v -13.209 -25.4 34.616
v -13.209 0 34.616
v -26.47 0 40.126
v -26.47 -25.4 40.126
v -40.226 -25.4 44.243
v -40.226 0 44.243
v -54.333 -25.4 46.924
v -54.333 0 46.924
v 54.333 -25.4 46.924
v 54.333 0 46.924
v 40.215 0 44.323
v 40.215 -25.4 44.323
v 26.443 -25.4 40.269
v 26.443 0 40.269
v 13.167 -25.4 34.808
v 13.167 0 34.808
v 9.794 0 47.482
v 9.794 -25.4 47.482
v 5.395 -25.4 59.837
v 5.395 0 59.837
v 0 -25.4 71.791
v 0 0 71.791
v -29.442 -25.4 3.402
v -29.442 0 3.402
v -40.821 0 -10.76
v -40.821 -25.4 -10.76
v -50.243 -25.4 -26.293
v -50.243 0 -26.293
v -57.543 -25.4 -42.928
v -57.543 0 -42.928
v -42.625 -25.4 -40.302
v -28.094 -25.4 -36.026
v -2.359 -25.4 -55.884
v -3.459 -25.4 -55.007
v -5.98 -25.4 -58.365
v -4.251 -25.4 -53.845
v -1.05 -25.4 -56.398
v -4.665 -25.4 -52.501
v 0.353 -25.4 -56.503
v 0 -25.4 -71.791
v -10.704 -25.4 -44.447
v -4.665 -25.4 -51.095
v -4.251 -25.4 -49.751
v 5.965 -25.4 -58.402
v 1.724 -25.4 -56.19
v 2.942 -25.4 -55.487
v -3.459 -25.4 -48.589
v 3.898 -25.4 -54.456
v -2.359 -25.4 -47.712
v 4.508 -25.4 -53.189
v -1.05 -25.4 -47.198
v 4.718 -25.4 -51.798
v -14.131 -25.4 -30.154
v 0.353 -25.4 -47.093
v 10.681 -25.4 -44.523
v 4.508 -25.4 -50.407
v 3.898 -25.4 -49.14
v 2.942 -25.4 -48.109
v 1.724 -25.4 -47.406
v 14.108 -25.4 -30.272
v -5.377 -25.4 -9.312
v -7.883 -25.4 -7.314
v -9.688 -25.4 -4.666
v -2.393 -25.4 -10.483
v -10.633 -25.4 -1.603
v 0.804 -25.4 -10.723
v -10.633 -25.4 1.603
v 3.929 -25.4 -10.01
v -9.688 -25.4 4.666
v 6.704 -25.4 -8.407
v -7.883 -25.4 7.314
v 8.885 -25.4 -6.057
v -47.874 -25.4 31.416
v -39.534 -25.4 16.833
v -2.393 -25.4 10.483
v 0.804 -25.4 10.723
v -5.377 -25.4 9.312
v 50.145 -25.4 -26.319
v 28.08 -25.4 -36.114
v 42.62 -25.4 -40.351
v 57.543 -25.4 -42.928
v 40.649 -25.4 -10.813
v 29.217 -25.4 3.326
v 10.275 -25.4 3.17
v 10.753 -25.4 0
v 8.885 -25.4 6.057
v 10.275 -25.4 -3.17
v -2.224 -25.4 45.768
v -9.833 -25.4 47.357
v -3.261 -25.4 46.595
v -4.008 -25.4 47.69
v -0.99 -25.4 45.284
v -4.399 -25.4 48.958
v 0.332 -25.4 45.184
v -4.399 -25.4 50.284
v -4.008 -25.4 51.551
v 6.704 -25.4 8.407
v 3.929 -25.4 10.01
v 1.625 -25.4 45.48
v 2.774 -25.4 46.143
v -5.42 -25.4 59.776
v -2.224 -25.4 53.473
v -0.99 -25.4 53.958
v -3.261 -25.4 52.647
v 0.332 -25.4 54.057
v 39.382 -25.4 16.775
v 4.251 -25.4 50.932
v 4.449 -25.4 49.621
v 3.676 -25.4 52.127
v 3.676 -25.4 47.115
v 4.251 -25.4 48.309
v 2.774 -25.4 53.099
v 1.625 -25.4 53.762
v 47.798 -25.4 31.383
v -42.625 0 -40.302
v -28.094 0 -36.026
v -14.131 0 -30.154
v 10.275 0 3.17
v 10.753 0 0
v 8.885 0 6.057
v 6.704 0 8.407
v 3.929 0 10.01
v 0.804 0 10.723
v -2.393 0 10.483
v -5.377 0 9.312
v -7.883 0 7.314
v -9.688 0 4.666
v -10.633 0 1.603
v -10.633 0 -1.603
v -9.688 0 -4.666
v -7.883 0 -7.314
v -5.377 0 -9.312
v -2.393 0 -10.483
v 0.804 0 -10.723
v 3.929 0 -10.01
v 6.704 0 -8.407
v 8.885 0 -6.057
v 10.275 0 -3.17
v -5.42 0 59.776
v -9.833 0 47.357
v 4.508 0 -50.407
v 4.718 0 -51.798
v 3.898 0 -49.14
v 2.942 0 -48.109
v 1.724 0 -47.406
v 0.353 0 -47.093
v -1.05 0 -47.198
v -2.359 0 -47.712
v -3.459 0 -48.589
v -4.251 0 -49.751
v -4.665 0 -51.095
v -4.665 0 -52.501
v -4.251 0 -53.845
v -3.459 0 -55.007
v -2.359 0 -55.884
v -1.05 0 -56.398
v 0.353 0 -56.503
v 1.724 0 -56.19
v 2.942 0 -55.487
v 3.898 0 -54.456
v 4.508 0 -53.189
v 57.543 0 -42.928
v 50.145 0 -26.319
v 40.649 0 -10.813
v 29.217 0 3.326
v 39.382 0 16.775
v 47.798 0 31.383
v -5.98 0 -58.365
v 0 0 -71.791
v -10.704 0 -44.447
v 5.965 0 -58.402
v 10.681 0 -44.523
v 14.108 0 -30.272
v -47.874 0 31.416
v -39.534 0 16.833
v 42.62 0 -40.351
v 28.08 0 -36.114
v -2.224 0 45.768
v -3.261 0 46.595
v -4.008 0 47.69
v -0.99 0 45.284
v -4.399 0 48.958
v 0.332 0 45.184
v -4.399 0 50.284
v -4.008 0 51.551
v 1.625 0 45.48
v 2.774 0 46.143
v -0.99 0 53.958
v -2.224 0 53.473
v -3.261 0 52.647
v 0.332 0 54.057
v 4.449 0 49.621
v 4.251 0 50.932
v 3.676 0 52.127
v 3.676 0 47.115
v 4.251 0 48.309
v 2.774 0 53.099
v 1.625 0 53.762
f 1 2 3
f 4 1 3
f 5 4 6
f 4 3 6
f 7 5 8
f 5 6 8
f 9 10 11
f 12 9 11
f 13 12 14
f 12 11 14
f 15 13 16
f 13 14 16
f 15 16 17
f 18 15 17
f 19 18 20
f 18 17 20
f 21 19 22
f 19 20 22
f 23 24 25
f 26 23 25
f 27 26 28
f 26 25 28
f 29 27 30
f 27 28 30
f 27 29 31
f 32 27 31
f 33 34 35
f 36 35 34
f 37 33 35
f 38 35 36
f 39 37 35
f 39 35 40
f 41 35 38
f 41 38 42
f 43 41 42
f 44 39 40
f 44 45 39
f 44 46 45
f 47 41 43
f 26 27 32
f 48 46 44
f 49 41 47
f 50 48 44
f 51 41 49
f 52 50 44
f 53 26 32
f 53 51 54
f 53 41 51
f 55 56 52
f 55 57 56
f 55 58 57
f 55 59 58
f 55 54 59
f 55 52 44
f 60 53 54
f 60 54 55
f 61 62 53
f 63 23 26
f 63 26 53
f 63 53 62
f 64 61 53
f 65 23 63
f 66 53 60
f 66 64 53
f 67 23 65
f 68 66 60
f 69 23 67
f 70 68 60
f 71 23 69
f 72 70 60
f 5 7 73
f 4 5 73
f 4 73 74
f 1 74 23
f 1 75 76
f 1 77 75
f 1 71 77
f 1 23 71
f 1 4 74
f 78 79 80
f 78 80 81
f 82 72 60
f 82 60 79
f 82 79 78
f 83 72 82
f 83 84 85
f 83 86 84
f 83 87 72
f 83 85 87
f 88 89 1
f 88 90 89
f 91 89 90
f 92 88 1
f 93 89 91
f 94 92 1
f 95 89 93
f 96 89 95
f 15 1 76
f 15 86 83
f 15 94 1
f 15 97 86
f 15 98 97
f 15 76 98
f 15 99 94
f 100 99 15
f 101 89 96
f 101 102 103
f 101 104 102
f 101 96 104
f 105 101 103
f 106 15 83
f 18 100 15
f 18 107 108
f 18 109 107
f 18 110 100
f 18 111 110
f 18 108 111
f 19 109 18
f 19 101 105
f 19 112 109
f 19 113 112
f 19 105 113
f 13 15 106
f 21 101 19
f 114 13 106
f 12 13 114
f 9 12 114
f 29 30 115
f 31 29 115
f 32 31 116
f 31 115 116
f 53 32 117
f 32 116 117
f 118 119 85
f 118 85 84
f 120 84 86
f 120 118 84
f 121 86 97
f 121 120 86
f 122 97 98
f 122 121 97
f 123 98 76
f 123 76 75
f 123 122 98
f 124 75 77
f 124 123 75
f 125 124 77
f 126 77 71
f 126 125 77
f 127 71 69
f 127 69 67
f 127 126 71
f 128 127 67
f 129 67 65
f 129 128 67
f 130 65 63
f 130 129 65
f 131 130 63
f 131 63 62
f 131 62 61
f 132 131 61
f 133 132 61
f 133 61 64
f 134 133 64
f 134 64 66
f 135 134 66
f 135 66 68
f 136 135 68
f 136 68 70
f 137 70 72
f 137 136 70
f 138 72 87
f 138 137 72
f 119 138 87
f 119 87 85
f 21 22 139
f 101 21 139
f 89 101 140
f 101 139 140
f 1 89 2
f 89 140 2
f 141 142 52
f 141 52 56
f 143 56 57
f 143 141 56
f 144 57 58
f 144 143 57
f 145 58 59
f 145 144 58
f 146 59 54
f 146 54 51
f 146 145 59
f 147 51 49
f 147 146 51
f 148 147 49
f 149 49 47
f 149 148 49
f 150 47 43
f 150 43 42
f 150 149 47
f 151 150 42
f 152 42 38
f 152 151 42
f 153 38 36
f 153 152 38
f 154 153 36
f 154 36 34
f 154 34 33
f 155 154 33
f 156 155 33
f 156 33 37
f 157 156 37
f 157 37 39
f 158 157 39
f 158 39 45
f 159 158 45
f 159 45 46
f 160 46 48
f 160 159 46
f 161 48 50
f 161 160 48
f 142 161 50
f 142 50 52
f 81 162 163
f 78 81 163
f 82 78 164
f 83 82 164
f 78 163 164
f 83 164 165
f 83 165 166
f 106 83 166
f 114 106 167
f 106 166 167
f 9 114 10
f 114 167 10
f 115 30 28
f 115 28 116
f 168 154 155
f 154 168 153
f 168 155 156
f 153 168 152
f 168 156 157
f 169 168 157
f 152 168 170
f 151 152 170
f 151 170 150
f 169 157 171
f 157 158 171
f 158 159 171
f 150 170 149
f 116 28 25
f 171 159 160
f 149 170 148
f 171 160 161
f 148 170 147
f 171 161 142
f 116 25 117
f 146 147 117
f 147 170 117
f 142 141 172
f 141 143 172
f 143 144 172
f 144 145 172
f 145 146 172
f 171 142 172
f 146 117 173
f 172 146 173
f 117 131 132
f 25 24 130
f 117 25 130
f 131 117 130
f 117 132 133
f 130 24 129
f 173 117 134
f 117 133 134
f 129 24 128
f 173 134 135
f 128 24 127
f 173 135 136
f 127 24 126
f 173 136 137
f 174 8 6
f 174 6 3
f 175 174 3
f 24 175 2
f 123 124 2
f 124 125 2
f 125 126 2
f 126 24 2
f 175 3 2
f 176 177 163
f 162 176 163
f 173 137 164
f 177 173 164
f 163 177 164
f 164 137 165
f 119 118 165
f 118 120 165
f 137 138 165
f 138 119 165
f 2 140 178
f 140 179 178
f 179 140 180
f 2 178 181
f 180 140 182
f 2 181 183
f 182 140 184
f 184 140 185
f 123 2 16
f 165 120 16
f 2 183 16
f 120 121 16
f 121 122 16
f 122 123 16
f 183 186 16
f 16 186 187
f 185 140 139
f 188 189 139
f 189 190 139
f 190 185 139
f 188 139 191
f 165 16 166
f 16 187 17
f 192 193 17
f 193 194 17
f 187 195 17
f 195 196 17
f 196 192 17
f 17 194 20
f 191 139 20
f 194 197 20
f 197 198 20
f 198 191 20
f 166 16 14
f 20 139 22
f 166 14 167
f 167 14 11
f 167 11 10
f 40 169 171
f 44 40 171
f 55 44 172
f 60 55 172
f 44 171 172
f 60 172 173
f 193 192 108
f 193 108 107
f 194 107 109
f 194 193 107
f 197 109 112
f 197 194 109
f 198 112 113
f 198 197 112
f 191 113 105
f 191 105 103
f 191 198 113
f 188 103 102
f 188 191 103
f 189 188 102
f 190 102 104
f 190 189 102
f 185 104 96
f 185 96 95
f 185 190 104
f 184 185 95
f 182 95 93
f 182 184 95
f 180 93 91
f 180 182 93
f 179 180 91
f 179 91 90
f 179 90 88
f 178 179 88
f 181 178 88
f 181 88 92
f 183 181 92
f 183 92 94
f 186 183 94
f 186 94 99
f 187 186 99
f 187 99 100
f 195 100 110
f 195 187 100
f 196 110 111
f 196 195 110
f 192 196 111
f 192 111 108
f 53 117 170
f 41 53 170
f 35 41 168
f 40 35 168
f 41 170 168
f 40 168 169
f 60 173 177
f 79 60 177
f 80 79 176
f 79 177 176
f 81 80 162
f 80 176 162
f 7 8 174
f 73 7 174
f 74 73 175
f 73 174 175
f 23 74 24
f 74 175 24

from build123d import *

# Parameters (mm, degrees)
F0_R     = 4.4487015319
F0_R_2   = 10.7530048188
F0_R_3   = 4.7180127793
F1_DEPTH = 25.4


with BuildPart() as f1:
    # F0 (on Front) → F1 (new body)
    with BuildSketch(Plane.XZ):
        with BuildLine():
            ThreePointArc((-29.4424401282, 3.4015260978), (-23.0262753535, 9.9406396762), (-16.1905688202, 16.0398439684))
            ThreePointArc((-16.1905688202, 16.0398439684), (-14.9730955589, 25.3716641264), (-13.2094991853, 34.6158426424))
            ThreePointArc((-13.2094991853, 34.6158426424), (-33.2950660075, 42.3616642817), (-54.3334142599, 46.9240814309))
            ThreePointArc((-54.3334142599, 46.9240814309), (-43.9313490235, 23.9941508784), (-29.4424401282, 3.4015260978))
        make_face()
        with BuildLine():
            ThreePointArc((-0.2127594199, 27.5427215846), (6.3768354794, 31.3598309723), (13.1668725149, 34.8077987896))
            ThreePointArc((13.1668725149, 34.8077987896), (7.721142089, 53.7045907434), (0, 71.7912900237))
            ThreePointArc((0, 71.7912900237), (-7.7540886954, 53.6119593723), (-13.2094991853, 34.6158426424))
            ThreePointArc((-13.2094991853, 34.6158426424), (-6.6172580099, 31.2517690189), (-0.2127594199, 27.5427215846))
        make_face()
        with Locations((0, 49.6207140386)):
            Circle(F0_R, mode=Mode.SUBTRACT)
        with BuildLine():
            ThreePointArc((13.1668725149, 34.8077987896), (14.9841600378, 25.3026214649), (16.223923099, 15.7050218969))
            ThreePointArc((16.223923099, 15.7050218969), (22.9196518716, 9.724571518), (29.2167284259, 3.3257124477))
            ThreePointArc((29.2167284259, 3.3257124477), (43.8176697051, 23.9481716961), (54.3334142599, 46.9240814309))
            ThreePointArc((54.3334142599, 46.9240814309), (33.2765171586, 42.4751427427), (13.1668725149, 34.8077987896))
        make_face()
        with BuildLine():
            ThreePointArc((-0.1224819877, -22.2551113905), (8.5491454913, -16.1687348266), (16.7184581773, -9.4231115752))
            ThreePointArc((16.7184581773, -9.4231115752), (16.9649715432, 3.1506730326), (16.223923099, 15.7050218969))
            ThreePointArc((16.223923099, 15.7050218969), (8.2207799897, 21.9226750358), (-0.2127594199, 27.5427215846))
            ThreePointArc((-0.2127594199, 27.5427215846), (-8.4069648764, 22.0764511026), (-16.1905688202, 16.0398439684))
            ThreePointArc((-16.1905688202, 16.0398439684), (-16.9635494943, 3.2221192601), (-16.7069505399, -9.6163277953))
            ThreePointArc((-16.7069505399, -9.6163277953), (-8.6597139653, -16.2572027994), (-0.1224819877, -22.2551113905))
        make_face()
        Circle(F0_R_2, mode=Mode.SUBTRACT)
        with BuildLine():
            ThreePointArc((-13.2094991853, 34.6158426424), (-14.9730955589, 25.3716641264), (-16.1905688202, 16.0398439684))
            ThreePointArc((-16.1905688202, 16.0398439684), (-8.4069648764, 22.0764511026), (-0.2127594199, 27.5427215846))
            ThreePointArc((-0.2127594199, 27.5427215846), (-6.6172580099, 31.2517690189), (-13.2094991853, 34.6158426424))
        make_face()
        with BuildLine():
            ThreePointArc((-0.2127594199, 27.5427215846), (8.2207799897, 21.9226750358), (16.223923099, 15.7050218969))
            ThreePointArc((16.223923099, 15.7050218969), (14.9841600378, 25.3026214649), (13.1668725149, 34.8077987896))
            ThreePointArc((13.1668725149, 34.8077987896), (6.3768354794, 31.3598309723), (-0.2127594199, 27.5427215846))
        make_face()
        with BuildLine():
            ThreePointArc((-57.542737113, -42.9281111723), (-35.2995419272, -38.3673220516), (-14.1309868657, -30.1543563216))
            ThreePointArc((-14.1309868657, -30.1543563216), (-15.7511847912, -19.9270099612), (-16.7069505399, -9.6163277953))
            ThreePointArc((-16.7069505399, -9.6163277953), (-23.2950130239, -3.3229397285), (-29.4424401282, 3.4015260978))
            ThreePointArc((-29.4424401282, 3.4015260978), (-45.7877840818, -18.3711885214), (-57.542737113, -42.9281111723))
        make_face()
        with BuildLine():
            ThreePointArc((-29.4424401282, 3.4015260978), (-23.2950130239, -3.3229397285), (-16.7069505399, -9.6163277953))
            ThreePointArc((-16.7069505399, -9.6163277953), (-16.9635494943, 3.2221192601), (-16.1905688202, 16.0398439684))
            ThreePointArc((-16.1905688202, 16.0398439684), (-23.0262753535, 9.9406396762), (-29.4424401282, 3.4015260978))
        make_face()
        with BuildLine():
            ThreePointArc((-16.7069505399, -9.6163277953), (-15.7511847912, -19.9270099612), (-14.1309868657, -30.1543563216))
            ThreePointArc((-14.1309868657, -30.1543563216), (-7.0093726235, -26.4128630389), (-0.1224819877, -22.2551113905))
            ThreePointArc((-0.1224819877, -22.2551113905), (-8.6597139653, -16.2572027994), (-16.7069505399, -9.6163277953))
        make_face()
        with BuildLine():
            ThreePointArc((-14.1309868657, -30.1543563216), (-8.5014831961, -51.4601778042), (0, -71.7912900237))
            ThreePointArc((0, -71.7912900237), (8.482288282, -51.5167009706), (14.1084600409, -30.2715987794))
            ThreePointArc((14.1084600409, -30.2715987794), (6.8713335487, -26.4793190065), (-0.1224819877, -22.2551113905))
            ThreePointArc((-0.1224819877, -22.2551113905), (-7.0093726235, -26.4128630389), (-14.1309868657, -30.1543563216))
        make_face()
        with Locations((0, -51.7978556454)):
            Circle(F0_R_3, mode=Mode.SUBTRACT)
        with BuildLine():
            ThreePointArc((16.7184581773, -9.4231115752), (15.7557958243, -19.8902119169), (14.1084600409, -30.2715987794))
            ThreePointArc((14.1084600409, -30.2715987794), (35.2902850673, -38.4369294065), (57.542737113, -42.9281111723))
            ThreePointArc((57.542737113, -42.9281111723), (45.6499453561, -18.4109129726), (29.2167284259, 3.3257124477))
            ThreePointArc((29.2167284259, 3.3257124477), (23.1779099268, -3.2548828175), (16.7184581773, -9.4231115752))
        make_face()
        with BuildLine():
            ThreePointArc((16.223923099, 15.7050218969), (16.9649715432, 3.1506730326), (16.7184581773, -9.4231115752))
            ThreePointArc((16.7184581773, -9.4231115752), (23.1779099268, -3.2548828175), (29.2167284259, 3.3257124477))
            ThreePointArc((29.2167284259, 3.3257124477), (22.9196518716, 9.724571518), (16.223923099, 15.7050218969))
        make_face()
        with BuildLine():
            ThreePointArc((-0.1224819877, -22.2551113905), (6.8713335487, -26.4793190065), (14.1084600409, -30.2715987794))
            ThreePointArc((14.1084600409, -30.2715987794), (15.7557958243, -19.8902119169), (16.7184581773, -9.4231115752))
            ThreePointArc((16.7184581773, -9.4231115752), (8.5491454913, -16.1687348266), (-0.1224819877, -22.2551113905))
        make_face()
    extrude(amount=F1_DEPTH)


solid = f1.part
